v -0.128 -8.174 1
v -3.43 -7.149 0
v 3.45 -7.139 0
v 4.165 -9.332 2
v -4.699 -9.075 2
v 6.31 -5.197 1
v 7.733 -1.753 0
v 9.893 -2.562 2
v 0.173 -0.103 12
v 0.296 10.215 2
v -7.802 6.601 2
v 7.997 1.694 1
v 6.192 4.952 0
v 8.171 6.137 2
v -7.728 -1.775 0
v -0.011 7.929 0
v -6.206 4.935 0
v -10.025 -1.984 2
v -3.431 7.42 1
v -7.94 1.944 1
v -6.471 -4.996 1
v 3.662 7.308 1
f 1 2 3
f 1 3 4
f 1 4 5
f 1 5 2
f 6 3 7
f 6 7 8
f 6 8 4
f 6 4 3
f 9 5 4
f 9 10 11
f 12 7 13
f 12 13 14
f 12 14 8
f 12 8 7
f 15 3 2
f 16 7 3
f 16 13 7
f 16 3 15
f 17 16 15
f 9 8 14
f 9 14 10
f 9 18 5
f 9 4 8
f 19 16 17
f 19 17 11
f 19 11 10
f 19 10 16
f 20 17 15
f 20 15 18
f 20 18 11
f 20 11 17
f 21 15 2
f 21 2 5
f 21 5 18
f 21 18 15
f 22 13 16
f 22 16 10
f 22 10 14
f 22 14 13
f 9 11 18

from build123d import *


with BuildPart() as f5:
    # F2 (on offset) → F5 section 0
    with BuildSketch(Plane.XY.offset(2), mode=Mode.PRIVATE) as f5_s0:
        Polygon((9.893138, -2.562072), (8.171379, 6.137341), (0.296405, 10.215211), (-7.801768, 6.600819), (-10.025051, -1.984125), (-4.699266, -9.074982), (4.165162, -9.332193), align=None)
    loft([Vertex(0.172753, -0.103171, 12), f5_s0.sketch])

    # F0 (on Top) → F6 section 0
    with BuildSketch(Plane.XY):
        Polygon((7.732626, -1.753436), (6.192105, 4.952361), (-0.011197, 7.928929), (-6.206068, 4.934852), (-7.727643, -1.775269), (-3.430145, -7.148577), (3.450322, -7.13886), align=None)
    # F5_face (on face) → F6 section 1
    with BuildSketch(Plane(origin=(0, 0, 2), x_dir=(1, 0, 0), z_dir=(0, 0, -1))):
        Polygon((9.893138, 2.562072), (4.165162, 9.332193), (-4.699266, 9.074982), (-10.025051, 1.984125), (-7.801768, -6.600819), (0.296405, -10.215211), (8.171379, -6.137341), align=None)
    loft()


solid = f5.part
